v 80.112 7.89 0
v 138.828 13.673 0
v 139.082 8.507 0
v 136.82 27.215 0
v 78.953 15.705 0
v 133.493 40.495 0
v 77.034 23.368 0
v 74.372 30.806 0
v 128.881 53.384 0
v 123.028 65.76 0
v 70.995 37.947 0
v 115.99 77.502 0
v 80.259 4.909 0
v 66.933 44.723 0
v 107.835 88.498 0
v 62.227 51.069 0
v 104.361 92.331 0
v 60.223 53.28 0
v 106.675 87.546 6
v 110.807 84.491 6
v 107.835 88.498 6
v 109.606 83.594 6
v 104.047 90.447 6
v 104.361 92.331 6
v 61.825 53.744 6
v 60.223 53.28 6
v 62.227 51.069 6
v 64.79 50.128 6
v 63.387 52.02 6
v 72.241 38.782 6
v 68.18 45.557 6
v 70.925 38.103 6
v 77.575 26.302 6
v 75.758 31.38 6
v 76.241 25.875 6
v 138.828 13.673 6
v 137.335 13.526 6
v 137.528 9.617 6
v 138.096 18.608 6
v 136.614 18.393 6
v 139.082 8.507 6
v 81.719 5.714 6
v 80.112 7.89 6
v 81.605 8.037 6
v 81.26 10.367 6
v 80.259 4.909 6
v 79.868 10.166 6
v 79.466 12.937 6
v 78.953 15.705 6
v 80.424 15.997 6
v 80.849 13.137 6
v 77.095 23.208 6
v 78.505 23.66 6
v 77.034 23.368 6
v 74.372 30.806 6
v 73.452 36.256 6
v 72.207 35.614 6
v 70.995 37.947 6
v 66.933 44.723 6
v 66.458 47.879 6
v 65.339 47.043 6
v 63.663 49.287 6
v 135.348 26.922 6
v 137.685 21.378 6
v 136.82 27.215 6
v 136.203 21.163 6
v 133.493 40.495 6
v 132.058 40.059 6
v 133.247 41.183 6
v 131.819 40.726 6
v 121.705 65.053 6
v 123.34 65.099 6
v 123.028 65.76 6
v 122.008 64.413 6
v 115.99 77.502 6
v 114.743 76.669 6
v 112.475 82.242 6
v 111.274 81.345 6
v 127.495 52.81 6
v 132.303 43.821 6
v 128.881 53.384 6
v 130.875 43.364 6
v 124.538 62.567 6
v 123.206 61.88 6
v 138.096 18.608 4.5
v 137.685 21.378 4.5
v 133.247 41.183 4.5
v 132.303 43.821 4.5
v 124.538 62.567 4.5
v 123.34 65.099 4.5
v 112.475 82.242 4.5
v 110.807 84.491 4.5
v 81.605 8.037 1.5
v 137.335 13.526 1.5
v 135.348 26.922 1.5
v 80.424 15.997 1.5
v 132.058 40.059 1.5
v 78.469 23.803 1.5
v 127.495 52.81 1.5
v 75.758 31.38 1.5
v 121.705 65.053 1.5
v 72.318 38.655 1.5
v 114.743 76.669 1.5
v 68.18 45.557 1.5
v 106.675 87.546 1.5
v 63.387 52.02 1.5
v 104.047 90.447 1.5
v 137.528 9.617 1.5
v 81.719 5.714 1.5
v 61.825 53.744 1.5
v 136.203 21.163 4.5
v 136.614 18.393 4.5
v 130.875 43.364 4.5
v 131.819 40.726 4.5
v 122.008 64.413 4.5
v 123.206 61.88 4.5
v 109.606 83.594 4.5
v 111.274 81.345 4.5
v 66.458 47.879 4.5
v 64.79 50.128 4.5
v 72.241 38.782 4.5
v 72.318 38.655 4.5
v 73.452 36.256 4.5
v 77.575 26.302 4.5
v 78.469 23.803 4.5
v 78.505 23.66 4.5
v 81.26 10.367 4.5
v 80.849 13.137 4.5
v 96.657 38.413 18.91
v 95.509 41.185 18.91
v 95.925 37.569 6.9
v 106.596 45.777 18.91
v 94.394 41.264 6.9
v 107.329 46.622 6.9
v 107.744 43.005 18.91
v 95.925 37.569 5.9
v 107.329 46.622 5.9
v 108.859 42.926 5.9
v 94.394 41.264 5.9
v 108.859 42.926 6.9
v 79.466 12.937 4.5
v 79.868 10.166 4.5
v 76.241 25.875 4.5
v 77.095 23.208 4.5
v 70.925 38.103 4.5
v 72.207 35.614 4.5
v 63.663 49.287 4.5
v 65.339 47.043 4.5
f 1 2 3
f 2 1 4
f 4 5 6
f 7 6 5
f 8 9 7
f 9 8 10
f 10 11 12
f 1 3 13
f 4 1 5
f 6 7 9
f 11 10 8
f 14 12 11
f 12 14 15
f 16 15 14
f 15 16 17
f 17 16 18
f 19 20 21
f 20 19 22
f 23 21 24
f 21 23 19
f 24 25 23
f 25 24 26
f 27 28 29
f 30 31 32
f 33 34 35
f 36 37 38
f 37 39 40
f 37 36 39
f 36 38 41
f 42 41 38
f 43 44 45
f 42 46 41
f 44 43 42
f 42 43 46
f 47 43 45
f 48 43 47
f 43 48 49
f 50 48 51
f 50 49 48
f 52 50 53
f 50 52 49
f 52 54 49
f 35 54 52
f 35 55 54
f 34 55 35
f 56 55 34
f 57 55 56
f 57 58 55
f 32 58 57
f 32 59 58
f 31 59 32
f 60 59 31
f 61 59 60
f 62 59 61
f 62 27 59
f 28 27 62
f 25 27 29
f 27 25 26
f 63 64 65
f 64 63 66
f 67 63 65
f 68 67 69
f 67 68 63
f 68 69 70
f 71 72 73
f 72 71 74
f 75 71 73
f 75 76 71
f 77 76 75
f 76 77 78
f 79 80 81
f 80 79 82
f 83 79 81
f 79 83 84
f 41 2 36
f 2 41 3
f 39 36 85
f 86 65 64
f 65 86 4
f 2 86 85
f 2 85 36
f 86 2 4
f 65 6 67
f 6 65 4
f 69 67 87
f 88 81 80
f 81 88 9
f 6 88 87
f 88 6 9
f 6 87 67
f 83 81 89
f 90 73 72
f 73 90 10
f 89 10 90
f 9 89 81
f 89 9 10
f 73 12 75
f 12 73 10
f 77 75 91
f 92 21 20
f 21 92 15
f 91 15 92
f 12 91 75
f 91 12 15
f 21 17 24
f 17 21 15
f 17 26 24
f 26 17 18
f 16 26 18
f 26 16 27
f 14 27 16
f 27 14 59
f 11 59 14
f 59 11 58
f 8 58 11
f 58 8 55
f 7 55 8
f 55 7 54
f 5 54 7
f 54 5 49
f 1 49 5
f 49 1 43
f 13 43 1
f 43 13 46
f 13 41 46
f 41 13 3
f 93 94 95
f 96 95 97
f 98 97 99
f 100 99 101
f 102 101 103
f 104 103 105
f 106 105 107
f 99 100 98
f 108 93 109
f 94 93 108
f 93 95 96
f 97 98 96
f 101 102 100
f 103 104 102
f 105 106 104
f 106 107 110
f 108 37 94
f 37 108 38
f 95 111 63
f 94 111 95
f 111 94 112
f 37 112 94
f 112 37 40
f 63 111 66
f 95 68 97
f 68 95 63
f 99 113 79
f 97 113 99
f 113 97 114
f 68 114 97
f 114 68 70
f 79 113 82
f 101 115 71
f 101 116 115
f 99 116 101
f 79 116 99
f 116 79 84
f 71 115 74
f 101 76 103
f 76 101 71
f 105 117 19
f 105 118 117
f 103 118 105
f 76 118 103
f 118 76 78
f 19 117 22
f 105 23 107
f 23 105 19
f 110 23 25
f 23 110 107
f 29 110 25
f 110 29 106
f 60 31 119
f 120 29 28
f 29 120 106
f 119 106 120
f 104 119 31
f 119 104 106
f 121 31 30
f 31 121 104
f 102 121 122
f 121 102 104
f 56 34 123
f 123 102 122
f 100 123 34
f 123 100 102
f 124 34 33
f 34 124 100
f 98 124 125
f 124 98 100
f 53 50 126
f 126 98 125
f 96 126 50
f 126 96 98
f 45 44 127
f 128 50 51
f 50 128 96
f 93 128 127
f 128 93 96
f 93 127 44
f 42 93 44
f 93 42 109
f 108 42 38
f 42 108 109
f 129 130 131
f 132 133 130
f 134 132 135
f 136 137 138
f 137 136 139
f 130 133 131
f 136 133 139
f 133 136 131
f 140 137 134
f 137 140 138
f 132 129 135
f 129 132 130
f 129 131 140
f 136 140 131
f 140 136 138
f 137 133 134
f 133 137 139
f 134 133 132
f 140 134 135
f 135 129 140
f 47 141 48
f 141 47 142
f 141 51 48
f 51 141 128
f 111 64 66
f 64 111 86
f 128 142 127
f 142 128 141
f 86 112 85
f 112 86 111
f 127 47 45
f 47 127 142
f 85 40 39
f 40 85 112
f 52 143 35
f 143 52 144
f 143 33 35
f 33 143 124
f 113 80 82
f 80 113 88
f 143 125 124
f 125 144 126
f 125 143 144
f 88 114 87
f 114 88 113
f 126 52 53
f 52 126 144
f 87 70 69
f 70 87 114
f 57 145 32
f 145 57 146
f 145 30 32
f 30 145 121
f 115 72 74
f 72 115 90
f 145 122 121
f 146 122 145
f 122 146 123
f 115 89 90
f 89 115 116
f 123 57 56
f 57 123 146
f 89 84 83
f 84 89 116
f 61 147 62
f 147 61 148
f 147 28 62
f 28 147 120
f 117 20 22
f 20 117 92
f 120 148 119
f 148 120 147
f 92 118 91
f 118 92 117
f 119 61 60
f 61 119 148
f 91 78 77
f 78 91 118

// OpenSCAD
// ═══════════════════════════════════════════════════════════════════════
//  CowPad — Biochar Cartridge  ·  Demo Model
//  Replaceable insert for Arc Tile and Sensor Tile
//
//  ► PRINT 1 COPY
//  ► Orientation : PULL TAB UP (cartridge body on build plate)
//  ► Layer height : 0.2mm
//  ► Infill       : 15% (lighter is fine — it's a container)
//  ► Supports     : NONE
//  ► Material     : PLA
//  ► Est. time    : ~45 min
//
//  HOW IT WORKS:
//    Fits into the fill cavity of the Arc Tile (0.5mm clearance all round).
//    Fill with real biochar granules before demo.
//    Pull tab grips above tile surface — one-finger pull to replace.
//    Mesh slots on top let urine in; biochar stays inside.
// ═══════════════════════════════════════════════════════════════════════

$fn = 64;

// ── Must match tile parameters ────────────────────────────────────────
IR = 75;
OR = 145;
ANG = 45;
BASE_H = 6;
FILL_H = 8;
CAV_WALL = 5;
CAV_ANG  = 3;

// ── Cartridge dimensions (cavity minus clearance) ─────────────────────
CART_IR   = IR + CAV_WALL + 0.5;    // = 80.5
CART_OR   = OR - CAV_WALL - 0.5;    // = 139.5
CART_A1   = CAV_ANG + 0.5;          // = 3.5°
CART_A2   = ANG - CAV_ANG - 0.5;    // = 41.5°
LID_H     = 1.5;                     // must match cowpad_tile_arc.scad LID_H
CART_H    = FILL_H - LID_H - 0.5;  // = 6.0mm (0.5mm clearance below lid)
CART_WALL = 1.5;                     // cartridge shell wall thickness

// ── Pull tab ──────────────────────────────────────────────────────────
TAB_W = 14;   // width
TAB_T = 4;    // thickness
TAB_H = 14;   // total height (protrudes above tile surface when seated)
              // 14 - 0.5 = 13.5mm above tile top — easy to grip

// ── Mesh slots (top surface) ─────────────────────────────────────────
N_SLOTS  = 4;
SLOT_W   = 2.8;
SLOT_D   = 1.5;  // depth into cartridge wall

// ═══════════════════════════════════════════════════════════════════════
// HELPERS
// ═══════════════════════════════════════════════════════════════════════

module pie_2d(r, a1, a2) {
  steps = max(4, ceil(a2 - a1));
  pts = concat([[0, 0]],
    [for (i = [0:steps])
      [r * cos(a1 + i*(a2-a1)/steps),
       r * sin(a1 + i*(a2-a1)/steps)]]);
  polygon(pts);
}

module ring_sector_2d(ri, ro, a1, a2) {
  intersection() {
    difference() { circle(ro); circle(ri); }
    pie_2d(ro + 1, a1, a2);
  }
}

module ring_sector(ri, ro, a1, a2, h) {
  linear_extrude(h) ring_sector_2d(ri, ro, a1, a2);
}

// ═══════════════════════════════════════════════════════════════════════
// MESH SLOTS — radial slots on top face, let urine in, keep biochar in
// ═══════════════════════════════════════════════════════════════════════

module mesh_slots() {
  for (i = [0:N_SLOTS-1]) {
    a = CART_A1 + (i + 0.5) * (CART_A2 - CART_A1) / N_SLOTS;
    rotate([0, 0, a])
      translate([CART_IR, -SLOT_W/2, CART_H - SLOT_D])
        cube([CART_OR - CART_IR, SLOT_W, SLOT_D + 0.1]);
  }
}

// ═══════════════════════════════════════════════════════════════════════
// HOLLOW SHELL — thin walls to hold biochar, open top
// Build as solid sector then hollow the inside
// ═══════════════════════════════════════════════════════════════════════

module cartridge_shell() {
  difference() {
    // Outer shell
    ring_sector(CART_IR, CART_OR, CART_A1, CART_A2, CART_H);
    // Hollow interior (open top)
    translate([0, 0, CART_WALL])
      ring_sector(CART_IR + CART_WALL, CART_OR - CART_WALL,
                  CART_A1 + 0.5, CART_A2 - 0.5,
                  CART_H);
  }
}

// ═══════════════════════════════════════════════════════════════════════
// PULL TAB — centred on the midpoint of the cartridge arc
// ═══════════════════════════════════════════════════════════════════════

module pull_tab() {
  // Position at arc midpoint, outer edge, projecting upward
  a_mid = (CART_A1 + CART_A2) / 2;
  r_tab = (CART_IR + CART_OR) / 2;
  rotate([0, 0, a_mid]) {
    translate([r_tab - TAB_W/2, -TAB_T/2, CART_H - 0.1])
      hull() {
        cube([TAB_W, TAB_T, 1]);
        translate([1, 0.5, TAB_H - 1])
          cube([TAB_W - 2, TAB_T - 1, 0.01]);
      }
  }
}

// ═══════════════════════════════════════════════════════════════════════
// ASSEMBLE
// ═══════════════════════════════════════════════════════════════════════

difference() {
  union() {
    cartridge_shell();
    pull_tab();
  }
  mesh_slots();
}
